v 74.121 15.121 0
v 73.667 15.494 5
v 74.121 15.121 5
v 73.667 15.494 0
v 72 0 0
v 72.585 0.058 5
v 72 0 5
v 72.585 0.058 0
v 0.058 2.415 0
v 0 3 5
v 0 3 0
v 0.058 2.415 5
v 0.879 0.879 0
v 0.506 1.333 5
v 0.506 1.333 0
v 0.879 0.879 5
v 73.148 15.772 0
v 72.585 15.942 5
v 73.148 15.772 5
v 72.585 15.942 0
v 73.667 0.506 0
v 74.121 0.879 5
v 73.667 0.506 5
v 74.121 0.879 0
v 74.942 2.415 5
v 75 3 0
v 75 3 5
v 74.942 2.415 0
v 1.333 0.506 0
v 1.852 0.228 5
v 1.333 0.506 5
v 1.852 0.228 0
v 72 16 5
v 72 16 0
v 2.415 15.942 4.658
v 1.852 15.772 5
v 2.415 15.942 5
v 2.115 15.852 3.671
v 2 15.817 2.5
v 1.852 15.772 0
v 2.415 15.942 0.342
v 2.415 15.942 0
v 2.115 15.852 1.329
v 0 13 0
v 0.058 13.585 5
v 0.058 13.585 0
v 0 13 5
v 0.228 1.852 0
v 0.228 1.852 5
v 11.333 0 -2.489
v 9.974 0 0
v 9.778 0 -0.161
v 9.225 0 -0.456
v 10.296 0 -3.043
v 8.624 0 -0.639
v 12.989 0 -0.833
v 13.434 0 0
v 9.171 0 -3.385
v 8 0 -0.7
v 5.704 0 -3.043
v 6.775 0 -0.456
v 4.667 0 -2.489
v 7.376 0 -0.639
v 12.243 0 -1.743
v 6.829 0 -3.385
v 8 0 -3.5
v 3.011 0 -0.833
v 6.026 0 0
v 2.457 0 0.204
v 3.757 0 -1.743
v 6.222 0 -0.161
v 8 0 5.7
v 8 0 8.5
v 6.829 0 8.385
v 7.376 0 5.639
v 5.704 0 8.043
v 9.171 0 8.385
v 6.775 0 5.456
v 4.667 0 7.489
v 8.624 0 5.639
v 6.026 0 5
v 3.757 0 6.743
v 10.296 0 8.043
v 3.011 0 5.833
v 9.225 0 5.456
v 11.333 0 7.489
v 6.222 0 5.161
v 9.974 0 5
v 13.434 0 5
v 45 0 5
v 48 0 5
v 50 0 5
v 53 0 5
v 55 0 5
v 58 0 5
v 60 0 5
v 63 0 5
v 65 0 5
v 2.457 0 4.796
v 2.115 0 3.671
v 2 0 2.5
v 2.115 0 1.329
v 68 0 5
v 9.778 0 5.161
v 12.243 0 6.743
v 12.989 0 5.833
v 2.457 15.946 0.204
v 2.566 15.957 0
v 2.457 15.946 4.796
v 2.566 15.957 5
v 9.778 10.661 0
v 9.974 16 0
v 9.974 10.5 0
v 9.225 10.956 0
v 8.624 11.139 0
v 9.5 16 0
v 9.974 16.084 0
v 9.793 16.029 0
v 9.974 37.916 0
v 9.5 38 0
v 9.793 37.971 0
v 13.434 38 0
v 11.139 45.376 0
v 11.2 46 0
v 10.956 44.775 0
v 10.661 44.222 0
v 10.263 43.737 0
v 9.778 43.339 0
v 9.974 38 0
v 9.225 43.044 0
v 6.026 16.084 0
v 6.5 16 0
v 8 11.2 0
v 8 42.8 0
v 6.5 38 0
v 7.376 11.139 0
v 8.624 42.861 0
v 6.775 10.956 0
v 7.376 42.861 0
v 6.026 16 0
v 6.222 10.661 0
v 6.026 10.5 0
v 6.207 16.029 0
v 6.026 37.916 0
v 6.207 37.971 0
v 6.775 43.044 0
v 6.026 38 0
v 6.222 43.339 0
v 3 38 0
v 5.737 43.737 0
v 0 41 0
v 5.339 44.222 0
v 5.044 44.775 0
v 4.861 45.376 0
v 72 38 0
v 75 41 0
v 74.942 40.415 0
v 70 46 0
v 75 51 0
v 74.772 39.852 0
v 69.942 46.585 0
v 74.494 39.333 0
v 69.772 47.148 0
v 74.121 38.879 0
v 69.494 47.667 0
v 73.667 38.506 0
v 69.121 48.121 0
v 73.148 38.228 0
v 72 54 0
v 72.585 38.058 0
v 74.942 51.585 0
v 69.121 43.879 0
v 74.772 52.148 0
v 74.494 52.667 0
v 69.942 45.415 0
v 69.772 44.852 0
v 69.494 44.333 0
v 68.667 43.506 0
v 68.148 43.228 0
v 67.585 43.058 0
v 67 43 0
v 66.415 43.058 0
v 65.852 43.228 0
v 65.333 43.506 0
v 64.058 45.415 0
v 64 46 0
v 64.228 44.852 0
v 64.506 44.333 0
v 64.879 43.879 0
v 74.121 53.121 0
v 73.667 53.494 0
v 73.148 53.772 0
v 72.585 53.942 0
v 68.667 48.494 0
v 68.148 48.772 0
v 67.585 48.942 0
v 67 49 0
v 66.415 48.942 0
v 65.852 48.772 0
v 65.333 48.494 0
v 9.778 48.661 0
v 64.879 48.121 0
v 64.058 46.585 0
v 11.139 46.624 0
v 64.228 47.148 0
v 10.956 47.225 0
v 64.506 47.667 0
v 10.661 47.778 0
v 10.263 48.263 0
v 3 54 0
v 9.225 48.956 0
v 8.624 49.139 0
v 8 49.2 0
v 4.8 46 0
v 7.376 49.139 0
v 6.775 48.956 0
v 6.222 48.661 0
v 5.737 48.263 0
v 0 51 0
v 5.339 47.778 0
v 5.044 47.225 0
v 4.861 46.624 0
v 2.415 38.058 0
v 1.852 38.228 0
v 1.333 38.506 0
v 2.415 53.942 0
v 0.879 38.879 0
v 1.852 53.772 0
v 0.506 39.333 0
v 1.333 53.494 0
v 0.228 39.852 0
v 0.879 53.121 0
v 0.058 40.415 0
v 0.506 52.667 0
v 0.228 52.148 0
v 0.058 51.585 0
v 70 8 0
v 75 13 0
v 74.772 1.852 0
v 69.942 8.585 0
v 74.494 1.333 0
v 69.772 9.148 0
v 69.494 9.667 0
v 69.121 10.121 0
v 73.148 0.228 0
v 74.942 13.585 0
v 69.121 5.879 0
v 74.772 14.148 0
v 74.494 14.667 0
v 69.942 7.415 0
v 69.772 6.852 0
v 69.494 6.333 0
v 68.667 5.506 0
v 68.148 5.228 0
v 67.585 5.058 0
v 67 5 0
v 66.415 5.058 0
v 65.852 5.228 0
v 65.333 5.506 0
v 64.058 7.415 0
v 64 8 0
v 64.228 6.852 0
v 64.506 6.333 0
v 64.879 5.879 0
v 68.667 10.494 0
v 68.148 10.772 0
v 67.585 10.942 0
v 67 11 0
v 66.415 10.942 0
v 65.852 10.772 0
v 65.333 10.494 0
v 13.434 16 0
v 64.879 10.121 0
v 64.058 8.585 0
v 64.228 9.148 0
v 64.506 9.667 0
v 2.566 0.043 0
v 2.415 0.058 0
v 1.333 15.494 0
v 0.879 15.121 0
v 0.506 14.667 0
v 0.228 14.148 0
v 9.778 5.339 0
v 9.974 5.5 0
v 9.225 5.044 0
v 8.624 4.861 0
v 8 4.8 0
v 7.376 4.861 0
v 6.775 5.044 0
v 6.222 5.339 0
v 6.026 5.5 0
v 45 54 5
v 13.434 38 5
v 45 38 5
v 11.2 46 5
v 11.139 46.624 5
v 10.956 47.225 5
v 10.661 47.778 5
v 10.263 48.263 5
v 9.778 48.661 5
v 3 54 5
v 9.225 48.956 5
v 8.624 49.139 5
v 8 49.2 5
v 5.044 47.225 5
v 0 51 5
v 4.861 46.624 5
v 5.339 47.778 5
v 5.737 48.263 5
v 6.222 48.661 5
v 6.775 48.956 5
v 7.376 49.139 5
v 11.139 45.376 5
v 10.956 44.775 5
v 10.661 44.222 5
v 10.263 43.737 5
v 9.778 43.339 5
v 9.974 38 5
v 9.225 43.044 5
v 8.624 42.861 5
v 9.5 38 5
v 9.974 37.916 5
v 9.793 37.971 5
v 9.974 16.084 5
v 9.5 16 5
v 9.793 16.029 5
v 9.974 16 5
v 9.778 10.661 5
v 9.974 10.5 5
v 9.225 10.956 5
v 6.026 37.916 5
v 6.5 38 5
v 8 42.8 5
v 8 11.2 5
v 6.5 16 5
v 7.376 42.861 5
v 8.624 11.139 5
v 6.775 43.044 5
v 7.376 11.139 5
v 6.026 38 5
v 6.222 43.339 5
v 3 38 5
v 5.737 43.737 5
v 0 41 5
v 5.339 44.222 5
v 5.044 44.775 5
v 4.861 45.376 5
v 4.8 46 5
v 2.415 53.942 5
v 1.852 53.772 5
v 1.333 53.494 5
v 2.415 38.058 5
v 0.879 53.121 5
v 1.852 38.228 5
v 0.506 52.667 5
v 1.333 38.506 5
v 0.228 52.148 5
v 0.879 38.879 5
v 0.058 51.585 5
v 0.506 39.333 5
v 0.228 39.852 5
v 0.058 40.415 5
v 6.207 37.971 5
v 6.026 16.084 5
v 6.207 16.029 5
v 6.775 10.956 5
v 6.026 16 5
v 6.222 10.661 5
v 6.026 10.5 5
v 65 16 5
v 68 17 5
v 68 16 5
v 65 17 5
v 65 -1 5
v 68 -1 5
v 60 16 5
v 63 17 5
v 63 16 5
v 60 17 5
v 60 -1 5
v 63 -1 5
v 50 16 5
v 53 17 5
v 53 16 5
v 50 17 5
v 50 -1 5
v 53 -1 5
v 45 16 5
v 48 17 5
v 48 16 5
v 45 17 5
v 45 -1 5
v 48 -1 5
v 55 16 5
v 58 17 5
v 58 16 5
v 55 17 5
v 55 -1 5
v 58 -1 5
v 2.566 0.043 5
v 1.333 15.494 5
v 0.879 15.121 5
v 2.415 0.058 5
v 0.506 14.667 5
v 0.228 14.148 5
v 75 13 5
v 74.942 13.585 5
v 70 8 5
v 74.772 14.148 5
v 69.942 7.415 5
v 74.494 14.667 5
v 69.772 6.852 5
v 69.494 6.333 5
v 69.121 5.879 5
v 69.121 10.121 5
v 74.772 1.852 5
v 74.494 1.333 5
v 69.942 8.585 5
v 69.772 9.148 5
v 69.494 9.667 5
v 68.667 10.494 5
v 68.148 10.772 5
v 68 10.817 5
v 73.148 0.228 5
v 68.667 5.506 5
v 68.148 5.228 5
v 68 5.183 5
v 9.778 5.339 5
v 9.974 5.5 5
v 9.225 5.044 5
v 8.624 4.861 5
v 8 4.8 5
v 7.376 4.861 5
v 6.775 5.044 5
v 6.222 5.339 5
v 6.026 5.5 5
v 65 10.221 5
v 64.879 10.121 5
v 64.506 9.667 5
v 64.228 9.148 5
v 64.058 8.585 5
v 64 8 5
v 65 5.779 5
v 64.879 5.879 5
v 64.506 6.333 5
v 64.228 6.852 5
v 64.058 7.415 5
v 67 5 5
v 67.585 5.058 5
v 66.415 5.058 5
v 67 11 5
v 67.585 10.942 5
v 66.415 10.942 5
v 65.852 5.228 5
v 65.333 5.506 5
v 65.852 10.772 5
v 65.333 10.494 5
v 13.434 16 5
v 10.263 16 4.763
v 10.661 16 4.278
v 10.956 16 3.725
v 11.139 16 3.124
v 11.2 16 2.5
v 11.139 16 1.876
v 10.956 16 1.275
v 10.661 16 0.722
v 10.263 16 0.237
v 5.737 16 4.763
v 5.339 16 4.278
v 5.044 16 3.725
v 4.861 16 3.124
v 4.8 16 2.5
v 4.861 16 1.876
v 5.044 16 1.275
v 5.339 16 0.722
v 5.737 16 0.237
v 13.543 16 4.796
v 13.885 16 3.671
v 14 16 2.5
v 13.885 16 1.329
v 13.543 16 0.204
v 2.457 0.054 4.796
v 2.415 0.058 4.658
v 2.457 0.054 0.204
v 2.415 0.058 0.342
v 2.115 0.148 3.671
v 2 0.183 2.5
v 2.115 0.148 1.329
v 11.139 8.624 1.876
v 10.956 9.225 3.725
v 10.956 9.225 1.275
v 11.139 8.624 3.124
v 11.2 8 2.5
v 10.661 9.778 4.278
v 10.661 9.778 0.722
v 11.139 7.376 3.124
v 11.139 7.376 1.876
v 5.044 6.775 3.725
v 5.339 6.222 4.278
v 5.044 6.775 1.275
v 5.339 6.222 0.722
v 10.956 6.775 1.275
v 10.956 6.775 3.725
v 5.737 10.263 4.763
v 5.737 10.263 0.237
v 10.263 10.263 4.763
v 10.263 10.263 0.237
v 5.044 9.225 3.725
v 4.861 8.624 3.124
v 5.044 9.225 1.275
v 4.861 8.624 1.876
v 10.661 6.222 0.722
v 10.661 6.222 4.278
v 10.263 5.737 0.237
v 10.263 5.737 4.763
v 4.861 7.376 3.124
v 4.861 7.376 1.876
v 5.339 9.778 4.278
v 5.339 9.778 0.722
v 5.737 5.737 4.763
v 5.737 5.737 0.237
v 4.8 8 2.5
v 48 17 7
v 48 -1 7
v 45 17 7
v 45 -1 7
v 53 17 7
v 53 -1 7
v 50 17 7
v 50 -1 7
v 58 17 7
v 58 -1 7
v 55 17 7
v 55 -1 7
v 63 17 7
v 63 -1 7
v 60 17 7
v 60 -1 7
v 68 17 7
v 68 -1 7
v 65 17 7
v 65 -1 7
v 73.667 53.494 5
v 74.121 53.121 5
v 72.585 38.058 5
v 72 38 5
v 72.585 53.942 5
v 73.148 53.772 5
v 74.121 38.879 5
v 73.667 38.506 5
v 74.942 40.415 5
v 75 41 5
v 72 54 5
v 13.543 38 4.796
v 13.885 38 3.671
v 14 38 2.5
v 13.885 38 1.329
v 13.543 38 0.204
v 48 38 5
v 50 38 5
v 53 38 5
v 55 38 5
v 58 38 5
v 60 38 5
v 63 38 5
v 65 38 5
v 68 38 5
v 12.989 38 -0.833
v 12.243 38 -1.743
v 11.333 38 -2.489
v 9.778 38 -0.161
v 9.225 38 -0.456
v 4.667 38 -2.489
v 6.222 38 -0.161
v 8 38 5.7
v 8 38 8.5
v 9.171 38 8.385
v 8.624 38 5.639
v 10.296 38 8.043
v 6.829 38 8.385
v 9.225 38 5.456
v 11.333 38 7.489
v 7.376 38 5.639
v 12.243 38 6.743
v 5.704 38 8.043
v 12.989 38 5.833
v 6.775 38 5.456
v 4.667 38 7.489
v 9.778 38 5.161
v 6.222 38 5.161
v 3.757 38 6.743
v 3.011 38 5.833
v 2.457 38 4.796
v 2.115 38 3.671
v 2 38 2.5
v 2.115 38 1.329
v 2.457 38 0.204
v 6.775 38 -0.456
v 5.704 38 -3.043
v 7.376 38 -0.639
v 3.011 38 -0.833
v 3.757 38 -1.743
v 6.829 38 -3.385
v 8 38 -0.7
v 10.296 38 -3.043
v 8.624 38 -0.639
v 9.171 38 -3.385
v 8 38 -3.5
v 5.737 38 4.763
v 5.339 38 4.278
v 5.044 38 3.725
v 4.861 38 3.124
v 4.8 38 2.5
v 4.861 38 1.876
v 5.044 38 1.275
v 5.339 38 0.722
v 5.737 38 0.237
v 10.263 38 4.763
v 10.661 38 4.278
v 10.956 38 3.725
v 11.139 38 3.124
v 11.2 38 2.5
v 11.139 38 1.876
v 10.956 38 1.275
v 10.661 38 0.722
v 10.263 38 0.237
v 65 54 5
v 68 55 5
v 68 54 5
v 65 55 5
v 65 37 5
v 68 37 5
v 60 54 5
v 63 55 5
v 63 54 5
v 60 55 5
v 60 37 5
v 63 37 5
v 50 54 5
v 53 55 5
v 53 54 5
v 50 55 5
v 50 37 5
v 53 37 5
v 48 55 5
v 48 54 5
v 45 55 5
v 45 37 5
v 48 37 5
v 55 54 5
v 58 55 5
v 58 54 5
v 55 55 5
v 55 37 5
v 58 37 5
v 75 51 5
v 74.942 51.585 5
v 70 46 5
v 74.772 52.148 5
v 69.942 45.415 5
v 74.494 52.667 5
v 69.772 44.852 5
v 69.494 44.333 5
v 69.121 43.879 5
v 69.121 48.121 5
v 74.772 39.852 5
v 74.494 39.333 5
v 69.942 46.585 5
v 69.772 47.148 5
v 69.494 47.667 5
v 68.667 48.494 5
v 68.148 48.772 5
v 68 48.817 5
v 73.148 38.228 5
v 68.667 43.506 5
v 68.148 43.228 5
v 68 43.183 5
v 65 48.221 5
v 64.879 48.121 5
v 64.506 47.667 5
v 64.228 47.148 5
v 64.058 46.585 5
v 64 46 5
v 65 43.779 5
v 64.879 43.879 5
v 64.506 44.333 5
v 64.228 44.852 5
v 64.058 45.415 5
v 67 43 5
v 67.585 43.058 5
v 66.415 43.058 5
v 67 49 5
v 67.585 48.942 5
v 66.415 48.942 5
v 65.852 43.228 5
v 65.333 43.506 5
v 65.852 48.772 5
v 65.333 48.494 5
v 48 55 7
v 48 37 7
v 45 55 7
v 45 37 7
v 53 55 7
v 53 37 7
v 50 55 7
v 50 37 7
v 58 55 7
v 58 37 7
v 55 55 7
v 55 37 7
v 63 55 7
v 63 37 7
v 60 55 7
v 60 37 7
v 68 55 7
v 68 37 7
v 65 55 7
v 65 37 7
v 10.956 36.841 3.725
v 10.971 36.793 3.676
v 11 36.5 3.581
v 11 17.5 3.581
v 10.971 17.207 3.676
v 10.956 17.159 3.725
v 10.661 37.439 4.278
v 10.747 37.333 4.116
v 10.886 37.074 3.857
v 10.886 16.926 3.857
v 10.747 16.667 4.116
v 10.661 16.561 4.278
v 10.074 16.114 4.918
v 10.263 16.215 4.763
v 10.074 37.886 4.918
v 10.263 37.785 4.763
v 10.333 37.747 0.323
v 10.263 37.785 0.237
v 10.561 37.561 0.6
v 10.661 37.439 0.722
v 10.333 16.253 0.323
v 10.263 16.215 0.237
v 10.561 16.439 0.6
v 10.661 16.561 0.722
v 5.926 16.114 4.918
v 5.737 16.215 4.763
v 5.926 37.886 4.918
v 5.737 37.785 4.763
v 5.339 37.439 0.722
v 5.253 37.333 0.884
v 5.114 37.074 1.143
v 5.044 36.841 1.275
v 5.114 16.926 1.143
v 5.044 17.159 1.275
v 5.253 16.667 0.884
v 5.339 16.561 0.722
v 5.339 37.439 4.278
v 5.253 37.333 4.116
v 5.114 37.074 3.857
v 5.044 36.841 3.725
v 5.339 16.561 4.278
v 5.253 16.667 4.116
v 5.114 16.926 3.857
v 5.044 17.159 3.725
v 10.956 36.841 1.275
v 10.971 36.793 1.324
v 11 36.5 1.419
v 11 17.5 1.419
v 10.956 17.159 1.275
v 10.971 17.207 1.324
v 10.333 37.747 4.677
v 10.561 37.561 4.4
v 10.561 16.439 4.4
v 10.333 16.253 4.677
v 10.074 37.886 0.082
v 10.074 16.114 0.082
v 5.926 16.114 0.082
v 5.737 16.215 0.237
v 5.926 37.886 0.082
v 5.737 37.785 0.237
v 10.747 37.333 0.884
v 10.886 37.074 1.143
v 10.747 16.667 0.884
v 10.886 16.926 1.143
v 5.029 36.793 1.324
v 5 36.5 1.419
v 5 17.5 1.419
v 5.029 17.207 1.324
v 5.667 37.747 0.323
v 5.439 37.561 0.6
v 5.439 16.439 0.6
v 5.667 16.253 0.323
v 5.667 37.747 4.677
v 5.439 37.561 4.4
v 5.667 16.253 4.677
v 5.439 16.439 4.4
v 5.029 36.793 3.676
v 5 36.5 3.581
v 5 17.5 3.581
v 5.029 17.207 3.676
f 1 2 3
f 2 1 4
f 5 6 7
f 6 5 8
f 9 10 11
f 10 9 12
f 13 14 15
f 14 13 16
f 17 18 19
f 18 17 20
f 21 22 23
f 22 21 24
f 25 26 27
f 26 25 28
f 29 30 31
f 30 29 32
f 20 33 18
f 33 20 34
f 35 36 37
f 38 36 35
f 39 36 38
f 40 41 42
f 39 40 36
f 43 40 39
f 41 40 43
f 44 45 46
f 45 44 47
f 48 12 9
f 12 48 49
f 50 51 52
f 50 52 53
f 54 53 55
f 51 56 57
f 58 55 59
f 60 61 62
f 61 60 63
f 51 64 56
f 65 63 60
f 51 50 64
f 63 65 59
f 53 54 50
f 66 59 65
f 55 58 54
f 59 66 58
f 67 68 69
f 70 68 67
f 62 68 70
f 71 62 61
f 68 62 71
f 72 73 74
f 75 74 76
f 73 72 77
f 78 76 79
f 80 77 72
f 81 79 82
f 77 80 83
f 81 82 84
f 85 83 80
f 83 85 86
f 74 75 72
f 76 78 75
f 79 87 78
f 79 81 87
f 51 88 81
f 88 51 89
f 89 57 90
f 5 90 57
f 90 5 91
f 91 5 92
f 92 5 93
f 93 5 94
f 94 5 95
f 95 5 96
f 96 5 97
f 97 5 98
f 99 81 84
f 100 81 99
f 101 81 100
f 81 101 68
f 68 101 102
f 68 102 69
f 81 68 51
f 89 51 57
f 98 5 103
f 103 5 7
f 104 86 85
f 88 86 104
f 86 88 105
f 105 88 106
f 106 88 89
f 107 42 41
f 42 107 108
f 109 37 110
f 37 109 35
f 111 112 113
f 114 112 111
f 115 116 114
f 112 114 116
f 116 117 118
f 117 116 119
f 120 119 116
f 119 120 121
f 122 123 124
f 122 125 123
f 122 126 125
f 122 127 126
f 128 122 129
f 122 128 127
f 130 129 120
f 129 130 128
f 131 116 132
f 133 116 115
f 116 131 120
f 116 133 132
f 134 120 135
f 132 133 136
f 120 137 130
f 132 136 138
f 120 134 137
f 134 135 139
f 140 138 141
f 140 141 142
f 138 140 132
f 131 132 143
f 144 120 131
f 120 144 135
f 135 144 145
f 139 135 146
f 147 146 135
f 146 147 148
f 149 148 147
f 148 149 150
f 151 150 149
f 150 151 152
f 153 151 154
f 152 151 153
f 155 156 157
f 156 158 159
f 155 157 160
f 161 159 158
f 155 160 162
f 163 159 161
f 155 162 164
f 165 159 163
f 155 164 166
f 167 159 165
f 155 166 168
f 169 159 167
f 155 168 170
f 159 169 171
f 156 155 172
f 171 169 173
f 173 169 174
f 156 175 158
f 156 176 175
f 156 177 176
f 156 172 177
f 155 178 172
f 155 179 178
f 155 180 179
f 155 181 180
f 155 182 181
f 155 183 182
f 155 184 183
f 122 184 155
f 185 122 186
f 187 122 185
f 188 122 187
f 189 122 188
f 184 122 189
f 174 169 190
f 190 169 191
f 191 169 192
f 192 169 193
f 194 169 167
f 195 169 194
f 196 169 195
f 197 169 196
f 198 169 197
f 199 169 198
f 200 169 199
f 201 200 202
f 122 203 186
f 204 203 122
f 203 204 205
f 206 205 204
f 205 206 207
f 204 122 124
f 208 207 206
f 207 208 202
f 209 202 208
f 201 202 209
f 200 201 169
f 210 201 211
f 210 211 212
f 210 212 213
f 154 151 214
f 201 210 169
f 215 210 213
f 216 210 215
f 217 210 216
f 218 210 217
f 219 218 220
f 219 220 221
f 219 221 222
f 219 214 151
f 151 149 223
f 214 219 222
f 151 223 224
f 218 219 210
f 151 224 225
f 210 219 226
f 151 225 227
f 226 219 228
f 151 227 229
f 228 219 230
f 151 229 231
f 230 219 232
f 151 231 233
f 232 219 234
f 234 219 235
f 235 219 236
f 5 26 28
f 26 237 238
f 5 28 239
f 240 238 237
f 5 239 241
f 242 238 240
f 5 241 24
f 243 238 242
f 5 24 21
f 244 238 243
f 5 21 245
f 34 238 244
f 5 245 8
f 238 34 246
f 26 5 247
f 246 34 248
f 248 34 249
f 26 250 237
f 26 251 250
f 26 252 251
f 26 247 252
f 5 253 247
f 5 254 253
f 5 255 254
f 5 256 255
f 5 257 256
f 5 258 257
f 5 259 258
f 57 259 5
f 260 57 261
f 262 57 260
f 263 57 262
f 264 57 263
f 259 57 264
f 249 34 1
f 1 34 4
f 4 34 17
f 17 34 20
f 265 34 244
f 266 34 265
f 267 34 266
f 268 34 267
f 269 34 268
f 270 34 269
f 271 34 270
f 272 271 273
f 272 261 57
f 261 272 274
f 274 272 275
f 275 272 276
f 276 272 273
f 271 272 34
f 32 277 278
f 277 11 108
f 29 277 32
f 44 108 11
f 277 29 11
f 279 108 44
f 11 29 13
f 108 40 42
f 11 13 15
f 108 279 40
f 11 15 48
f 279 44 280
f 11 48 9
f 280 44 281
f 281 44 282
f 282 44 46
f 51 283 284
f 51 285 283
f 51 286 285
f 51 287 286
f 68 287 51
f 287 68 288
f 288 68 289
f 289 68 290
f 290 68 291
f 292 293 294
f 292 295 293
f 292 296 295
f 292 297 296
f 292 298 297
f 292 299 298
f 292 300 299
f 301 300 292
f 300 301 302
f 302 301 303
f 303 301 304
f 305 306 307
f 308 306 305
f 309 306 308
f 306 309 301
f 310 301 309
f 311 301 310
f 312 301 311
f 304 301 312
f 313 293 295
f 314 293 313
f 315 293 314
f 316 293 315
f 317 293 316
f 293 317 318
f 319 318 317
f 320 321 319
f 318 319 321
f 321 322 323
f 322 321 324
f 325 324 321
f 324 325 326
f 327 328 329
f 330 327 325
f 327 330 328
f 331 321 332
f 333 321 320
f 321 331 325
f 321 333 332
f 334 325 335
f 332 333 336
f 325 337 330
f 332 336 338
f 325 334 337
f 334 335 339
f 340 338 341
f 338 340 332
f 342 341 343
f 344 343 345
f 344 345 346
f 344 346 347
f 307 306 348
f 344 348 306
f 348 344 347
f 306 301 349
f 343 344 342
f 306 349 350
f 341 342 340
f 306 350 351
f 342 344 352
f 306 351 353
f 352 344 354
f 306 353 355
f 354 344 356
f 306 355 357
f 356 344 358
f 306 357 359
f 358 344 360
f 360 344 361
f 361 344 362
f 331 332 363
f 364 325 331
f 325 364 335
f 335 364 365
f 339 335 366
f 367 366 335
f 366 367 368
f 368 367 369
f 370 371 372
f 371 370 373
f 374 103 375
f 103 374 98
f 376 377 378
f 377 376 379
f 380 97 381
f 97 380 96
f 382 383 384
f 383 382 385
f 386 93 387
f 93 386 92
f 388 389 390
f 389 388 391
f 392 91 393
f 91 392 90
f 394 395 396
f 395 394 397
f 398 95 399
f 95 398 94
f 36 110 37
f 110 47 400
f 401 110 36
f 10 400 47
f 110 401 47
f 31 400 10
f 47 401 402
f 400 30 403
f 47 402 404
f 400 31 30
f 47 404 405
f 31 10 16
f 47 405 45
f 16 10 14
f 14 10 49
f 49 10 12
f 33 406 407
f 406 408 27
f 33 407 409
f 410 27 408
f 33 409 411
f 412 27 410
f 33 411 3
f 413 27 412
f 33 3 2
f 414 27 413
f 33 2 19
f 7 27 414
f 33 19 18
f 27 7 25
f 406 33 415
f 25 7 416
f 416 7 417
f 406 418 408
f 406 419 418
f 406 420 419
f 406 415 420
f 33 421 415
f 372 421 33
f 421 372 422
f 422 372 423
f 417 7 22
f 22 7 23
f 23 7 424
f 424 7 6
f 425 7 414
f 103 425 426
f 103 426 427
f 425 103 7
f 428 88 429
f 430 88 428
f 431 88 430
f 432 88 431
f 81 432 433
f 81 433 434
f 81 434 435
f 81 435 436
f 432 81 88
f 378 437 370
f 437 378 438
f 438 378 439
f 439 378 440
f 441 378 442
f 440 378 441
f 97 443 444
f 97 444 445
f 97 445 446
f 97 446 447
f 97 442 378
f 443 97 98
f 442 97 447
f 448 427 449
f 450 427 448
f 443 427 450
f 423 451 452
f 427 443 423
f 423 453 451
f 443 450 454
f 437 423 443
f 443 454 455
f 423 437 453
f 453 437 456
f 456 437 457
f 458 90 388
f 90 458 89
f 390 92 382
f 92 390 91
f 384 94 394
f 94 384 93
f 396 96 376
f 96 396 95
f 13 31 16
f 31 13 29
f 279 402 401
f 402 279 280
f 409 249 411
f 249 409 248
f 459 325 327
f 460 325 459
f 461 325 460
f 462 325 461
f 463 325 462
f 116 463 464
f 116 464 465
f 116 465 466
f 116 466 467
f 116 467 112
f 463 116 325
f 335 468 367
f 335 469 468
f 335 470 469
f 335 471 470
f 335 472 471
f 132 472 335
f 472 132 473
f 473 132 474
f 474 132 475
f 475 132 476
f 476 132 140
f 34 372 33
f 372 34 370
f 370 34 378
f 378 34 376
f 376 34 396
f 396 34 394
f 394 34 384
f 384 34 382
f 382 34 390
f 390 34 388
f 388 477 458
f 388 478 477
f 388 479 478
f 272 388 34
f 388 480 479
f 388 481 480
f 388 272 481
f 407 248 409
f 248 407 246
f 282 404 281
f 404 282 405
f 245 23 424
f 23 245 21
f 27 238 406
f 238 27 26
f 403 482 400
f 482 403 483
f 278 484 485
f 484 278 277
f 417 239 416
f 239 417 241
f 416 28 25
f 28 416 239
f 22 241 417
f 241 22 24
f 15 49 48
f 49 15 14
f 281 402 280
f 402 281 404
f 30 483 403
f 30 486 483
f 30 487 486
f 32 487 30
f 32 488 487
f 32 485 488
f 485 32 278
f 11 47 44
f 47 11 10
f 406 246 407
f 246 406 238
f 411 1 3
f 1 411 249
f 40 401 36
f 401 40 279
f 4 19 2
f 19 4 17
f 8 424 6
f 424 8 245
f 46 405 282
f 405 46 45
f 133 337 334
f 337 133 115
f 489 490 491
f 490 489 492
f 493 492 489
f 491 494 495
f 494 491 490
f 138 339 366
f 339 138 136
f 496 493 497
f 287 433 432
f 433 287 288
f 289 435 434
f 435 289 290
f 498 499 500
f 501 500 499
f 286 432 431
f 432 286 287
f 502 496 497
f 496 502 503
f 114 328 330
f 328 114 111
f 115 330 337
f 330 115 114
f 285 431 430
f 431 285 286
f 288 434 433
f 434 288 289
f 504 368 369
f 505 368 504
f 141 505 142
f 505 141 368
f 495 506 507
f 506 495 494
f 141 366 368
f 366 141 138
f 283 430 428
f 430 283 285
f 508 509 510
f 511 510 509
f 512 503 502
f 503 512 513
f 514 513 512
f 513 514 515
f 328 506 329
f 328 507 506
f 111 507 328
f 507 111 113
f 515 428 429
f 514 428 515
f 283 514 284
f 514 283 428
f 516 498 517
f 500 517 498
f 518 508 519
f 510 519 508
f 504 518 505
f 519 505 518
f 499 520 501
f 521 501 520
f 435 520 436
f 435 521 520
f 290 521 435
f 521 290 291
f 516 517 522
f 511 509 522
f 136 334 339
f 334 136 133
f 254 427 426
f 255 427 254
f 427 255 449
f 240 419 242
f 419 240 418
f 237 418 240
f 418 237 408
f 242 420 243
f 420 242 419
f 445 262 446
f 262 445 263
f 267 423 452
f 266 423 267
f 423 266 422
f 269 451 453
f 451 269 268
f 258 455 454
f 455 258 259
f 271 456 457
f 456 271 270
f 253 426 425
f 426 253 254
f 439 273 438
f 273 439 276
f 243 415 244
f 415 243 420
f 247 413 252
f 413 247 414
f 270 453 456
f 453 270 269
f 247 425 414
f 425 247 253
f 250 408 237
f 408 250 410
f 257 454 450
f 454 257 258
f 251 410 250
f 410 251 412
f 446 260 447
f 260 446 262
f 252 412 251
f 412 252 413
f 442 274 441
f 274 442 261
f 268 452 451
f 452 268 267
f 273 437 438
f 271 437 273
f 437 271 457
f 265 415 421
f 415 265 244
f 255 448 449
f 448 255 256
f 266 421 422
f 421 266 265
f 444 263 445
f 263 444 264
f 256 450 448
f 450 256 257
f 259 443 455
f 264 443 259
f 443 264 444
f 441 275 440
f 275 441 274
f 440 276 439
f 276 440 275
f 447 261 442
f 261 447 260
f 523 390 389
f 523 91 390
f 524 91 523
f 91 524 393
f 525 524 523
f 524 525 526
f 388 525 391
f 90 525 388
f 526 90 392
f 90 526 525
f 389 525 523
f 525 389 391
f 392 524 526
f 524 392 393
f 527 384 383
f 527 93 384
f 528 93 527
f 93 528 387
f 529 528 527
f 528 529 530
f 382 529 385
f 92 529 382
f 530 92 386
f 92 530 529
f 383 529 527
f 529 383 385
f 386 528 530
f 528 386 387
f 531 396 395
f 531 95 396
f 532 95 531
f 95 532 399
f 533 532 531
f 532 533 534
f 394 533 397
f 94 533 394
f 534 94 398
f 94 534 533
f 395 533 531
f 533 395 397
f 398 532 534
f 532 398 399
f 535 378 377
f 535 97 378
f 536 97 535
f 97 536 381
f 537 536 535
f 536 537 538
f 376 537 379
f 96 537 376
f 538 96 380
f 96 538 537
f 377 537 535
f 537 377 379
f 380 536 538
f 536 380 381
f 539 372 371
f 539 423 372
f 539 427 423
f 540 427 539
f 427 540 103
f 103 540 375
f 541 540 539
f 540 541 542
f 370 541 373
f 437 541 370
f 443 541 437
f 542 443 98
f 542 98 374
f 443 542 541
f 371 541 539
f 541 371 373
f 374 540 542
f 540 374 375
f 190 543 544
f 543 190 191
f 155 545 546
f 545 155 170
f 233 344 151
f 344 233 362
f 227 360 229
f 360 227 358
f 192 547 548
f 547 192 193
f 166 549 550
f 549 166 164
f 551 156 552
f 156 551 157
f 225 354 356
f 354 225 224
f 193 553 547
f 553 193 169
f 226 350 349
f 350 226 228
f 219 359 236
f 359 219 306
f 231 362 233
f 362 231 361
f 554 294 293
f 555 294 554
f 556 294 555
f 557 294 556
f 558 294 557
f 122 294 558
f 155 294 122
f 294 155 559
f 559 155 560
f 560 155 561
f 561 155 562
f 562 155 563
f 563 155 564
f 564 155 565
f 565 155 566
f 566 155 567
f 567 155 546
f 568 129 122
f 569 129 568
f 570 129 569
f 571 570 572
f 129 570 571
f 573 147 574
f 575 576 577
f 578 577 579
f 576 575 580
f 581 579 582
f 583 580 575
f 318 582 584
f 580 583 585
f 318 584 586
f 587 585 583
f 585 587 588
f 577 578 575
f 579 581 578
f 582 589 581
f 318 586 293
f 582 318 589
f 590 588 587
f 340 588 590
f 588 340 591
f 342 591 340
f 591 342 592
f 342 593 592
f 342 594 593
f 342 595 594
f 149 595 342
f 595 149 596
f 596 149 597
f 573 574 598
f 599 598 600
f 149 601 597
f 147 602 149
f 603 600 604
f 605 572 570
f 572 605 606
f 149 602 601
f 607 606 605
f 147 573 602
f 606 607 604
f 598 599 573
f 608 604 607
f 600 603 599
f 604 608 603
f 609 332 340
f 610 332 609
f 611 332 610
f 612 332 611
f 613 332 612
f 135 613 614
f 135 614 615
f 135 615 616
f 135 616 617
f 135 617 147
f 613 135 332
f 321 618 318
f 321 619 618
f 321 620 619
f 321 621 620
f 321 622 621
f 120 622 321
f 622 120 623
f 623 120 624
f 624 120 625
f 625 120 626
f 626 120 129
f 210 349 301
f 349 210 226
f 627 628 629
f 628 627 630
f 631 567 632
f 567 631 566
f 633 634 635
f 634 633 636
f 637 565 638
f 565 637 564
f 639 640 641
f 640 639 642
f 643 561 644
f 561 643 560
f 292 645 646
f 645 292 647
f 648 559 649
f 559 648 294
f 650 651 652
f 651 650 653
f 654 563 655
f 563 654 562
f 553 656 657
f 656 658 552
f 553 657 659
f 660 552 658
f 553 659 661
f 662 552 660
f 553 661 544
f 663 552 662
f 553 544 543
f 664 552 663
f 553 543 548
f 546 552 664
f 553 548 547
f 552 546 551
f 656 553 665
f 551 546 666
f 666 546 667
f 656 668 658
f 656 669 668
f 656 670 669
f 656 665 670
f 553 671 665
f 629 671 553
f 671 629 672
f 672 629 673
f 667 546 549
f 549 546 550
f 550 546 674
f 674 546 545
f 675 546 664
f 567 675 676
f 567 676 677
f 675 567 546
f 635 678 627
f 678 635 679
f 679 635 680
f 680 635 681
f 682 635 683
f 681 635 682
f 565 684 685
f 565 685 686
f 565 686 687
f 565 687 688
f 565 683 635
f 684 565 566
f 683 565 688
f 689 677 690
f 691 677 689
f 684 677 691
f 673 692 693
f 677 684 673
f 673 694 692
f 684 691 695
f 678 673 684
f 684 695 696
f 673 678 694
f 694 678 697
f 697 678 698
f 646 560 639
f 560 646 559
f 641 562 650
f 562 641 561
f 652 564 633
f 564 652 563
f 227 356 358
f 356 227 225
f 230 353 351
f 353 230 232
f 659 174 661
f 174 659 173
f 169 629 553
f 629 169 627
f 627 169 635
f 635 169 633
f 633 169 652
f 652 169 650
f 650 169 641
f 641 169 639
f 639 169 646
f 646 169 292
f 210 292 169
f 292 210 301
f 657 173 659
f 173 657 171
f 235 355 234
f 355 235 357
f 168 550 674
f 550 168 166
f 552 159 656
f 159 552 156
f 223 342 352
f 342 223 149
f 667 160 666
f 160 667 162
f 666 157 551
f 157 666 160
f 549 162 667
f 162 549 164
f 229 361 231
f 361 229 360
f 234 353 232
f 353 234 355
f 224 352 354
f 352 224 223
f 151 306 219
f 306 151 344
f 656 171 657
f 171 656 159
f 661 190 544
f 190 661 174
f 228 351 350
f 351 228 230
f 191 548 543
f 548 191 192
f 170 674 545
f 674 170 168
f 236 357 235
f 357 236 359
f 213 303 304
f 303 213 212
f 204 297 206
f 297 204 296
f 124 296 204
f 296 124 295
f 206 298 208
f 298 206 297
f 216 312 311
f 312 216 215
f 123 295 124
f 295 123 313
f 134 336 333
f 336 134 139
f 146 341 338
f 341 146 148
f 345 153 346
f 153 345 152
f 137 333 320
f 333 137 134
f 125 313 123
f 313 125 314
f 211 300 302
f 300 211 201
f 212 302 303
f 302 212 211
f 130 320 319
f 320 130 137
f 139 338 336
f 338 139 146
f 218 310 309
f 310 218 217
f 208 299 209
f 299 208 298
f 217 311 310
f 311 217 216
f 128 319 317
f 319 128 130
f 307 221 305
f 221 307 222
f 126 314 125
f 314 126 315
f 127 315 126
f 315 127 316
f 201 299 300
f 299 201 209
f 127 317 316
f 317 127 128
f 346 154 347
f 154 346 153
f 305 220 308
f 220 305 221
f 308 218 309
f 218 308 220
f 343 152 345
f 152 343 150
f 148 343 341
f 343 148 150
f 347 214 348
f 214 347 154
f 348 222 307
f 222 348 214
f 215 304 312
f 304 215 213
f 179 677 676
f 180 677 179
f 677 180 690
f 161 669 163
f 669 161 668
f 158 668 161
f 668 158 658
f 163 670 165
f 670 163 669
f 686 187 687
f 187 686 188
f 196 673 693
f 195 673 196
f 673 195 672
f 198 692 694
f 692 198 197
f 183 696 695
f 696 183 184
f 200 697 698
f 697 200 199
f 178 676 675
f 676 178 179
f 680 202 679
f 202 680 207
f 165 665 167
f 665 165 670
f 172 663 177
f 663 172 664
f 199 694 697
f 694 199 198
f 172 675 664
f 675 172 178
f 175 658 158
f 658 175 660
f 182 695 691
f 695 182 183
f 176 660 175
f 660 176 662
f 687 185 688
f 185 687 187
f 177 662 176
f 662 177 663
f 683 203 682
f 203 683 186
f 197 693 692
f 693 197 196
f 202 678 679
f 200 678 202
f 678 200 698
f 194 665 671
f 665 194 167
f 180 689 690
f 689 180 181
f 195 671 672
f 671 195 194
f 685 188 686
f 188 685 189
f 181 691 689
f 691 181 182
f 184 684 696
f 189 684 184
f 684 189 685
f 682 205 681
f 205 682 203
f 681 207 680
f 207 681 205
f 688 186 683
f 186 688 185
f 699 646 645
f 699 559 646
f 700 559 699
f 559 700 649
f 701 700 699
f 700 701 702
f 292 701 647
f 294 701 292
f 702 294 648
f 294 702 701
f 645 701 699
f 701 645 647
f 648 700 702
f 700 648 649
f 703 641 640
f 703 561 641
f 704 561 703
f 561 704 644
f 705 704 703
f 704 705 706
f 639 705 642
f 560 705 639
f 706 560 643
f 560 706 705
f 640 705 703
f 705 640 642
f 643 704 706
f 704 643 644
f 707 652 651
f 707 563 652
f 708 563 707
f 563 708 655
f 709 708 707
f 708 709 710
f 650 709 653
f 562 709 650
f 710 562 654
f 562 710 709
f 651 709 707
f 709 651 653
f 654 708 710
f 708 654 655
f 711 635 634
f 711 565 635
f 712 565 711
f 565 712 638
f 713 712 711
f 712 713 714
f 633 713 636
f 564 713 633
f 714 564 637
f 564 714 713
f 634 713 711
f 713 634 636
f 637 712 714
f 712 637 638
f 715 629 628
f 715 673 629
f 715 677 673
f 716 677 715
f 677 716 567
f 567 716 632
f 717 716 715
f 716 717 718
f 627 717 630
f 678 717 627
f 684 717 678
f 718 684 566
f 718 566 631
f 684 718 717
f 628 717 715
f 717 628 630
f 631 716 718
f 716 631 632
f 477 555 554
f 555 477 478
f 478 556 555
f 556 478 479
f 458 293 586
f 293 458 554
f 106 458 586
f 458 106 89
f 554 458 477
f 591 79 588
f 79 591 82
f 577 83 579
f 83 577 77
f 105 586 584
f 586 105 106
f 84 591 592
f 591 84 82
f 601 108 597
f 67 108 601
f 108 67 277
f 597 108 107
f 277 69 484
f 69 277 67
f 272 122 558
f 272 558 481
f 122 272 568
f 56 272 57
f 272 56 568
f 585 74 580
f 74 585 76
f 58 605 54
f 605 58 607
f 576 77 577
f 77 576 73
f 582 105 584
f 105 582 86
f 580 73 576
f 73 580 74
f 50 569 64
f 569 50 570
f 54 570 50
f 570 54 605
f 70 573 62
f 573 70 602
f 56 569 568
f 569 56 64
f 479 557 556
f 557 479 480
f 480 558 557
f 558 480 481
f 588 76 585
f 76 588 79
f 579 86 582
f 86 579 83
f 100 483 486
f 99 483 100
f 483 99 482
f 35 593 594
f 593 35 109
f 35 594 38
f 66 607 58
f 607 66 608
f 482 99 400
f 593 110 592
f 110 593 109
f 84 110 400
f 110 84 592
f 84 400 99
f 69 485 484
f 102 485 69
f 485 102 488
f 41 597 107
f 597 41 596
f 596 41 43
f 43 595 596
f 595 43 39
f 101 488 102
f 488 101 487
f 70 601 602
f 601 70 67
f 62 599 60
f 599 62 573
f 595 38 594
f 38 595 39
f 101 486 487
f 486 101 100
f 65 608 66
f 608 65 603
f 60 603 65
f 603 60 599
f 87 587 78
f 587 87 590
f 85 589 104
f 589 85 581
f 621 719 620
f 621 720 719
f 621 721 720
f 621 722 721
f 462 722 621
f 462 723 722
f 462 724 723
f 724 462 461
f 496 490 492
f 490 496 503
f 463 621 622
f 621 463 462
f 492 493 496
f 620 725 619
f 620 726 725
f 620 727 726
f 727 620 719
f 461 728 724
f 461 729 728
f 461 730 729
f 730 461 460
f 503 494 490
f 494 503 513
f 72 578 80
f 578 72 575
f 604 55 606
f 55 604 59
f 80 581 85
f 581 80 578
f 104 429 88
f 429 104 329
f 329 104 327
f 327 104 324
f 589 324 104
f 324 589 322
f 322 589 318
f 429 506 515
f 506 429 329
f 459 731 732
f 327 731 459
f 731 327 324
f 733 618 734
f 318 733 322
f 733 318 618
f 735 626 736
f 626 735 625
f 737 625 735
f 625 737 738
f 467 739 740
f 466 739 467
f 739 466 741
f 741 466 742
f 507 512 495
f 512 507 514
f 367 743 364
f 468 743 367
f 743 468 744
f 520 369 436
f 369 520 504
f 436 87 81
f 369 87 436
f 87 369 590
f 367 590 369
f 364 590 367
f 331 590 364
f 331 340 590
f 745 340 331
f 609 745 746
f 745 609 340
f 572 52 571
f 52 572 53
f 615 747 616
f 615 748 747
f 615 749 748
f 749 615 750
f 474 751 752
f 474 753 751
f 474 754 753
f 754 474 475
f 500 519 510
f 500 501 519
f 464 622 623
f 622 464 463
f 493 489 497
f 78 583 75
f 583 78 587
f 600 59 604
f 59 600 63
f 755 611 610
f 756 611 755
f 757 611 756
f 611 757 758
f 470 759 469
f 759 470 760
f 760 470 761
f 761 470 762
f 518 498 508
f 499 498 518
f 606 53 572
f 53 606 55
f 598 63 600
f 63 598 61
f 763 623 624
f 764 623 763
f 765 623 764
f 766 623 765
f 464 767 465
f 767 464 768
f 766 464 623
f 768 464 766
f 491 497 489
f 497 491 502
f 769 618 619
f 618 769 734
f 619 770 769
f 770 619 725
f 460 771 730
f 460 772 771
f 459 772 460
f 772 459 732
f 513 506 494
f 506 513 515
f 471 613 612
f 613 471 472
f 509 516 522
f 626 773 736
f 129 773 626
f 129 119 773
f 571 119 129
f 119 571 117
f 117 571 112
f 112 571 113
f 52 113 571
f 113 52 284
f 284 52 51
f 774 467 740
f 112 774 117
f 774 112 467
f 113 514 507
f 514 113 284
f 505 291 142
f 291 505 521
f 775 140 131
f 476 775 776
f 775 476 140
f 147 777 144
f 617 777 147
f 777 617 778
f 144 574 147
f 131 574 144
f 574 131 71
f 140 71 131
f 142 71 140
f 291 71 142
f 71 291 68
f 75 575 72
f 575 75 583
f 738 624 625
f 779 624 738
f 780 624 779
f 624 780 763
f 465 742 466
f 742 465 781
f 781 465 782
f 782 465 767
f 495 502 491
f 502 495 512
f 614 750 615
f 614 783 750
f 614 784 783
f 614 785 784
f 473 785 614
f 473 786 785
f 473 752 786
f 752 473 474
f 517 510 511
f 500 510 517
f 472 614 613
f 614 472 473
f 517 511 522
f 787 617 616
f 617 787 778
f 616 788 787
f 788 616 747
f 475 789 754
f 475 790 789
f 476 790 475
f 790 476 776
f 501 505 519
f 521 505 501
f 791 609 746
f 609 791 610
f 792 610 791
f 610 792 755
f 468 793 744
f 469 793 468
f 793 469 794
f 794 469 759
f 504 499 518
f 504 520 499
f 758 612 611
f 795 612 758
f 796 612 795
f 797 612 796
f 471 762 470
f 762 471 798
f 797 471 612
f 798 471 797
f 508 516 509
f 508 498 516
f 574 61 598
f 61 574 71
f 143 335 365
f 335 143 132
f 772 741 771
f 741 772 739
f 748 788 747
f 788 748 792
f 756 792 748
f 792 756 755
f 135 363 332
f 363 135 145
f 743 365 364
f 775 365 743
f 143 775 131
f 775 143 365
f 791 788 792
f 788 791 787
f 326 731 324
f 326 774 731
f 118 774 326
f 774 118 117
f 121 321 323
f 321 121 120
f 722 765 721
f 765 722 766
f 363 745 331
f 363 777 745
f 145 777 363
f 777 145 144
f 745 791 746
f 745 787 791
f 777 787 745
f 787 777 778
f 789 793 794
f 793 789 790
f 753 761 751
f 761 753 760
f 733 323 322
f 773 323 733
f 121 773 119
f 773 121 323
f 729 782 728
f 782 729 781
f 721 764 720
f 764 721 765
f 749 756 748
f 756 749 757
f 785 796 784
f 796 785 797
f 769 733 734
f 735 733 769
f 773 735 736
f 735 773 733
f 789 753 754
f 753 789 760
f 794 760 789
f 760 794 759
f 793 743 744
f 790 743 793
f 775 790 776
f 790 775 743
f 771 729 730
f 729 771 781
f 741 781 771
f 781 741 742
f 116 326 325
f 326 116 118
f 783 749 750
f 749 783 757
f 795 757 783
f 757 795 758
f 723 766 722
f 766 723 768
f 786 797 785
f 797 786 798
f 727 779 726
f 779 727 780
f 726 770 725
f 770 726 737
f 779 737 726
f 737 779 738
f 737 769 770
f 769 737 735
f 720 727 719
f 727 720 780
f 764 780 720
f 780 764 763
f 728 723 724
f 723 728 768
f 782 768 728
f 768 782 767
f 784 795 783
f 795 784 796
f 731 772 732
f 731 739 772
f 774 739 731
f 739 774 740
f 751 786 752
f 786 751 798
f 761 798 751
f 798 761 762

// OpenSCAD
// 3D Printed Multi Purpose Grip Clip
// Simple beginner OpenSCAD model

$fn = 32;

clip_length = 75;
arm_width = 16;
arm_thickness = 5;
gap = 22;

hinge_radius = 6;
hinge_hole = 3.2;
bump_height = 2;

module rounded_box(x, y, z, r=2) {
    hull() {
        translate([r,r,0]) cylinder(r=r,h=z);
        translate([x-r,r,0]) cylinder(r=r,h=z);
        translate([r,y-r,0]) cylinder(r=r,h=z);
        translate([x-r,y-r,0]) cylinder(r=r,h=z);
    }
}

module arm() {
    difference() {
        rounded_box(clip_length, arm_width, arm_thickness, 3);

        translate([8, arm_width/2, -1])
            cylinder(r=hinge_hole, h=arm_thickness+2);

        translate([clip_length-8, arm_width/2, -1])
            cylinder(r=3, h=arm_thickness+2);
    }

    // simple grip ridges
    for (i=[0:4]) {
        translate([clip_length-30+i*5, -1, arm_thickness])
            cube([3, arm_width+2, bump_height]);
    }
}

module grip_clip() {
    arm();

    translate([0, gap+arm_width, 0])
        arm();

    // hinge cylinder
    translate([8, arm_width/2 + gap/2, arm_thickness/2])
        rotate([90,0,0])
        difference() {
            cylinder(r=hinge_radius, h=gap+arm_width, center=true);
            cylinder(r=hinge_hole, h=gap+arm_width+2, center=true);
        }

    // middle connector
    translate([5, arm_width, 0])
        rounded_box(6, gap, arm_thickness, 1.5);
}

grip_clip();
